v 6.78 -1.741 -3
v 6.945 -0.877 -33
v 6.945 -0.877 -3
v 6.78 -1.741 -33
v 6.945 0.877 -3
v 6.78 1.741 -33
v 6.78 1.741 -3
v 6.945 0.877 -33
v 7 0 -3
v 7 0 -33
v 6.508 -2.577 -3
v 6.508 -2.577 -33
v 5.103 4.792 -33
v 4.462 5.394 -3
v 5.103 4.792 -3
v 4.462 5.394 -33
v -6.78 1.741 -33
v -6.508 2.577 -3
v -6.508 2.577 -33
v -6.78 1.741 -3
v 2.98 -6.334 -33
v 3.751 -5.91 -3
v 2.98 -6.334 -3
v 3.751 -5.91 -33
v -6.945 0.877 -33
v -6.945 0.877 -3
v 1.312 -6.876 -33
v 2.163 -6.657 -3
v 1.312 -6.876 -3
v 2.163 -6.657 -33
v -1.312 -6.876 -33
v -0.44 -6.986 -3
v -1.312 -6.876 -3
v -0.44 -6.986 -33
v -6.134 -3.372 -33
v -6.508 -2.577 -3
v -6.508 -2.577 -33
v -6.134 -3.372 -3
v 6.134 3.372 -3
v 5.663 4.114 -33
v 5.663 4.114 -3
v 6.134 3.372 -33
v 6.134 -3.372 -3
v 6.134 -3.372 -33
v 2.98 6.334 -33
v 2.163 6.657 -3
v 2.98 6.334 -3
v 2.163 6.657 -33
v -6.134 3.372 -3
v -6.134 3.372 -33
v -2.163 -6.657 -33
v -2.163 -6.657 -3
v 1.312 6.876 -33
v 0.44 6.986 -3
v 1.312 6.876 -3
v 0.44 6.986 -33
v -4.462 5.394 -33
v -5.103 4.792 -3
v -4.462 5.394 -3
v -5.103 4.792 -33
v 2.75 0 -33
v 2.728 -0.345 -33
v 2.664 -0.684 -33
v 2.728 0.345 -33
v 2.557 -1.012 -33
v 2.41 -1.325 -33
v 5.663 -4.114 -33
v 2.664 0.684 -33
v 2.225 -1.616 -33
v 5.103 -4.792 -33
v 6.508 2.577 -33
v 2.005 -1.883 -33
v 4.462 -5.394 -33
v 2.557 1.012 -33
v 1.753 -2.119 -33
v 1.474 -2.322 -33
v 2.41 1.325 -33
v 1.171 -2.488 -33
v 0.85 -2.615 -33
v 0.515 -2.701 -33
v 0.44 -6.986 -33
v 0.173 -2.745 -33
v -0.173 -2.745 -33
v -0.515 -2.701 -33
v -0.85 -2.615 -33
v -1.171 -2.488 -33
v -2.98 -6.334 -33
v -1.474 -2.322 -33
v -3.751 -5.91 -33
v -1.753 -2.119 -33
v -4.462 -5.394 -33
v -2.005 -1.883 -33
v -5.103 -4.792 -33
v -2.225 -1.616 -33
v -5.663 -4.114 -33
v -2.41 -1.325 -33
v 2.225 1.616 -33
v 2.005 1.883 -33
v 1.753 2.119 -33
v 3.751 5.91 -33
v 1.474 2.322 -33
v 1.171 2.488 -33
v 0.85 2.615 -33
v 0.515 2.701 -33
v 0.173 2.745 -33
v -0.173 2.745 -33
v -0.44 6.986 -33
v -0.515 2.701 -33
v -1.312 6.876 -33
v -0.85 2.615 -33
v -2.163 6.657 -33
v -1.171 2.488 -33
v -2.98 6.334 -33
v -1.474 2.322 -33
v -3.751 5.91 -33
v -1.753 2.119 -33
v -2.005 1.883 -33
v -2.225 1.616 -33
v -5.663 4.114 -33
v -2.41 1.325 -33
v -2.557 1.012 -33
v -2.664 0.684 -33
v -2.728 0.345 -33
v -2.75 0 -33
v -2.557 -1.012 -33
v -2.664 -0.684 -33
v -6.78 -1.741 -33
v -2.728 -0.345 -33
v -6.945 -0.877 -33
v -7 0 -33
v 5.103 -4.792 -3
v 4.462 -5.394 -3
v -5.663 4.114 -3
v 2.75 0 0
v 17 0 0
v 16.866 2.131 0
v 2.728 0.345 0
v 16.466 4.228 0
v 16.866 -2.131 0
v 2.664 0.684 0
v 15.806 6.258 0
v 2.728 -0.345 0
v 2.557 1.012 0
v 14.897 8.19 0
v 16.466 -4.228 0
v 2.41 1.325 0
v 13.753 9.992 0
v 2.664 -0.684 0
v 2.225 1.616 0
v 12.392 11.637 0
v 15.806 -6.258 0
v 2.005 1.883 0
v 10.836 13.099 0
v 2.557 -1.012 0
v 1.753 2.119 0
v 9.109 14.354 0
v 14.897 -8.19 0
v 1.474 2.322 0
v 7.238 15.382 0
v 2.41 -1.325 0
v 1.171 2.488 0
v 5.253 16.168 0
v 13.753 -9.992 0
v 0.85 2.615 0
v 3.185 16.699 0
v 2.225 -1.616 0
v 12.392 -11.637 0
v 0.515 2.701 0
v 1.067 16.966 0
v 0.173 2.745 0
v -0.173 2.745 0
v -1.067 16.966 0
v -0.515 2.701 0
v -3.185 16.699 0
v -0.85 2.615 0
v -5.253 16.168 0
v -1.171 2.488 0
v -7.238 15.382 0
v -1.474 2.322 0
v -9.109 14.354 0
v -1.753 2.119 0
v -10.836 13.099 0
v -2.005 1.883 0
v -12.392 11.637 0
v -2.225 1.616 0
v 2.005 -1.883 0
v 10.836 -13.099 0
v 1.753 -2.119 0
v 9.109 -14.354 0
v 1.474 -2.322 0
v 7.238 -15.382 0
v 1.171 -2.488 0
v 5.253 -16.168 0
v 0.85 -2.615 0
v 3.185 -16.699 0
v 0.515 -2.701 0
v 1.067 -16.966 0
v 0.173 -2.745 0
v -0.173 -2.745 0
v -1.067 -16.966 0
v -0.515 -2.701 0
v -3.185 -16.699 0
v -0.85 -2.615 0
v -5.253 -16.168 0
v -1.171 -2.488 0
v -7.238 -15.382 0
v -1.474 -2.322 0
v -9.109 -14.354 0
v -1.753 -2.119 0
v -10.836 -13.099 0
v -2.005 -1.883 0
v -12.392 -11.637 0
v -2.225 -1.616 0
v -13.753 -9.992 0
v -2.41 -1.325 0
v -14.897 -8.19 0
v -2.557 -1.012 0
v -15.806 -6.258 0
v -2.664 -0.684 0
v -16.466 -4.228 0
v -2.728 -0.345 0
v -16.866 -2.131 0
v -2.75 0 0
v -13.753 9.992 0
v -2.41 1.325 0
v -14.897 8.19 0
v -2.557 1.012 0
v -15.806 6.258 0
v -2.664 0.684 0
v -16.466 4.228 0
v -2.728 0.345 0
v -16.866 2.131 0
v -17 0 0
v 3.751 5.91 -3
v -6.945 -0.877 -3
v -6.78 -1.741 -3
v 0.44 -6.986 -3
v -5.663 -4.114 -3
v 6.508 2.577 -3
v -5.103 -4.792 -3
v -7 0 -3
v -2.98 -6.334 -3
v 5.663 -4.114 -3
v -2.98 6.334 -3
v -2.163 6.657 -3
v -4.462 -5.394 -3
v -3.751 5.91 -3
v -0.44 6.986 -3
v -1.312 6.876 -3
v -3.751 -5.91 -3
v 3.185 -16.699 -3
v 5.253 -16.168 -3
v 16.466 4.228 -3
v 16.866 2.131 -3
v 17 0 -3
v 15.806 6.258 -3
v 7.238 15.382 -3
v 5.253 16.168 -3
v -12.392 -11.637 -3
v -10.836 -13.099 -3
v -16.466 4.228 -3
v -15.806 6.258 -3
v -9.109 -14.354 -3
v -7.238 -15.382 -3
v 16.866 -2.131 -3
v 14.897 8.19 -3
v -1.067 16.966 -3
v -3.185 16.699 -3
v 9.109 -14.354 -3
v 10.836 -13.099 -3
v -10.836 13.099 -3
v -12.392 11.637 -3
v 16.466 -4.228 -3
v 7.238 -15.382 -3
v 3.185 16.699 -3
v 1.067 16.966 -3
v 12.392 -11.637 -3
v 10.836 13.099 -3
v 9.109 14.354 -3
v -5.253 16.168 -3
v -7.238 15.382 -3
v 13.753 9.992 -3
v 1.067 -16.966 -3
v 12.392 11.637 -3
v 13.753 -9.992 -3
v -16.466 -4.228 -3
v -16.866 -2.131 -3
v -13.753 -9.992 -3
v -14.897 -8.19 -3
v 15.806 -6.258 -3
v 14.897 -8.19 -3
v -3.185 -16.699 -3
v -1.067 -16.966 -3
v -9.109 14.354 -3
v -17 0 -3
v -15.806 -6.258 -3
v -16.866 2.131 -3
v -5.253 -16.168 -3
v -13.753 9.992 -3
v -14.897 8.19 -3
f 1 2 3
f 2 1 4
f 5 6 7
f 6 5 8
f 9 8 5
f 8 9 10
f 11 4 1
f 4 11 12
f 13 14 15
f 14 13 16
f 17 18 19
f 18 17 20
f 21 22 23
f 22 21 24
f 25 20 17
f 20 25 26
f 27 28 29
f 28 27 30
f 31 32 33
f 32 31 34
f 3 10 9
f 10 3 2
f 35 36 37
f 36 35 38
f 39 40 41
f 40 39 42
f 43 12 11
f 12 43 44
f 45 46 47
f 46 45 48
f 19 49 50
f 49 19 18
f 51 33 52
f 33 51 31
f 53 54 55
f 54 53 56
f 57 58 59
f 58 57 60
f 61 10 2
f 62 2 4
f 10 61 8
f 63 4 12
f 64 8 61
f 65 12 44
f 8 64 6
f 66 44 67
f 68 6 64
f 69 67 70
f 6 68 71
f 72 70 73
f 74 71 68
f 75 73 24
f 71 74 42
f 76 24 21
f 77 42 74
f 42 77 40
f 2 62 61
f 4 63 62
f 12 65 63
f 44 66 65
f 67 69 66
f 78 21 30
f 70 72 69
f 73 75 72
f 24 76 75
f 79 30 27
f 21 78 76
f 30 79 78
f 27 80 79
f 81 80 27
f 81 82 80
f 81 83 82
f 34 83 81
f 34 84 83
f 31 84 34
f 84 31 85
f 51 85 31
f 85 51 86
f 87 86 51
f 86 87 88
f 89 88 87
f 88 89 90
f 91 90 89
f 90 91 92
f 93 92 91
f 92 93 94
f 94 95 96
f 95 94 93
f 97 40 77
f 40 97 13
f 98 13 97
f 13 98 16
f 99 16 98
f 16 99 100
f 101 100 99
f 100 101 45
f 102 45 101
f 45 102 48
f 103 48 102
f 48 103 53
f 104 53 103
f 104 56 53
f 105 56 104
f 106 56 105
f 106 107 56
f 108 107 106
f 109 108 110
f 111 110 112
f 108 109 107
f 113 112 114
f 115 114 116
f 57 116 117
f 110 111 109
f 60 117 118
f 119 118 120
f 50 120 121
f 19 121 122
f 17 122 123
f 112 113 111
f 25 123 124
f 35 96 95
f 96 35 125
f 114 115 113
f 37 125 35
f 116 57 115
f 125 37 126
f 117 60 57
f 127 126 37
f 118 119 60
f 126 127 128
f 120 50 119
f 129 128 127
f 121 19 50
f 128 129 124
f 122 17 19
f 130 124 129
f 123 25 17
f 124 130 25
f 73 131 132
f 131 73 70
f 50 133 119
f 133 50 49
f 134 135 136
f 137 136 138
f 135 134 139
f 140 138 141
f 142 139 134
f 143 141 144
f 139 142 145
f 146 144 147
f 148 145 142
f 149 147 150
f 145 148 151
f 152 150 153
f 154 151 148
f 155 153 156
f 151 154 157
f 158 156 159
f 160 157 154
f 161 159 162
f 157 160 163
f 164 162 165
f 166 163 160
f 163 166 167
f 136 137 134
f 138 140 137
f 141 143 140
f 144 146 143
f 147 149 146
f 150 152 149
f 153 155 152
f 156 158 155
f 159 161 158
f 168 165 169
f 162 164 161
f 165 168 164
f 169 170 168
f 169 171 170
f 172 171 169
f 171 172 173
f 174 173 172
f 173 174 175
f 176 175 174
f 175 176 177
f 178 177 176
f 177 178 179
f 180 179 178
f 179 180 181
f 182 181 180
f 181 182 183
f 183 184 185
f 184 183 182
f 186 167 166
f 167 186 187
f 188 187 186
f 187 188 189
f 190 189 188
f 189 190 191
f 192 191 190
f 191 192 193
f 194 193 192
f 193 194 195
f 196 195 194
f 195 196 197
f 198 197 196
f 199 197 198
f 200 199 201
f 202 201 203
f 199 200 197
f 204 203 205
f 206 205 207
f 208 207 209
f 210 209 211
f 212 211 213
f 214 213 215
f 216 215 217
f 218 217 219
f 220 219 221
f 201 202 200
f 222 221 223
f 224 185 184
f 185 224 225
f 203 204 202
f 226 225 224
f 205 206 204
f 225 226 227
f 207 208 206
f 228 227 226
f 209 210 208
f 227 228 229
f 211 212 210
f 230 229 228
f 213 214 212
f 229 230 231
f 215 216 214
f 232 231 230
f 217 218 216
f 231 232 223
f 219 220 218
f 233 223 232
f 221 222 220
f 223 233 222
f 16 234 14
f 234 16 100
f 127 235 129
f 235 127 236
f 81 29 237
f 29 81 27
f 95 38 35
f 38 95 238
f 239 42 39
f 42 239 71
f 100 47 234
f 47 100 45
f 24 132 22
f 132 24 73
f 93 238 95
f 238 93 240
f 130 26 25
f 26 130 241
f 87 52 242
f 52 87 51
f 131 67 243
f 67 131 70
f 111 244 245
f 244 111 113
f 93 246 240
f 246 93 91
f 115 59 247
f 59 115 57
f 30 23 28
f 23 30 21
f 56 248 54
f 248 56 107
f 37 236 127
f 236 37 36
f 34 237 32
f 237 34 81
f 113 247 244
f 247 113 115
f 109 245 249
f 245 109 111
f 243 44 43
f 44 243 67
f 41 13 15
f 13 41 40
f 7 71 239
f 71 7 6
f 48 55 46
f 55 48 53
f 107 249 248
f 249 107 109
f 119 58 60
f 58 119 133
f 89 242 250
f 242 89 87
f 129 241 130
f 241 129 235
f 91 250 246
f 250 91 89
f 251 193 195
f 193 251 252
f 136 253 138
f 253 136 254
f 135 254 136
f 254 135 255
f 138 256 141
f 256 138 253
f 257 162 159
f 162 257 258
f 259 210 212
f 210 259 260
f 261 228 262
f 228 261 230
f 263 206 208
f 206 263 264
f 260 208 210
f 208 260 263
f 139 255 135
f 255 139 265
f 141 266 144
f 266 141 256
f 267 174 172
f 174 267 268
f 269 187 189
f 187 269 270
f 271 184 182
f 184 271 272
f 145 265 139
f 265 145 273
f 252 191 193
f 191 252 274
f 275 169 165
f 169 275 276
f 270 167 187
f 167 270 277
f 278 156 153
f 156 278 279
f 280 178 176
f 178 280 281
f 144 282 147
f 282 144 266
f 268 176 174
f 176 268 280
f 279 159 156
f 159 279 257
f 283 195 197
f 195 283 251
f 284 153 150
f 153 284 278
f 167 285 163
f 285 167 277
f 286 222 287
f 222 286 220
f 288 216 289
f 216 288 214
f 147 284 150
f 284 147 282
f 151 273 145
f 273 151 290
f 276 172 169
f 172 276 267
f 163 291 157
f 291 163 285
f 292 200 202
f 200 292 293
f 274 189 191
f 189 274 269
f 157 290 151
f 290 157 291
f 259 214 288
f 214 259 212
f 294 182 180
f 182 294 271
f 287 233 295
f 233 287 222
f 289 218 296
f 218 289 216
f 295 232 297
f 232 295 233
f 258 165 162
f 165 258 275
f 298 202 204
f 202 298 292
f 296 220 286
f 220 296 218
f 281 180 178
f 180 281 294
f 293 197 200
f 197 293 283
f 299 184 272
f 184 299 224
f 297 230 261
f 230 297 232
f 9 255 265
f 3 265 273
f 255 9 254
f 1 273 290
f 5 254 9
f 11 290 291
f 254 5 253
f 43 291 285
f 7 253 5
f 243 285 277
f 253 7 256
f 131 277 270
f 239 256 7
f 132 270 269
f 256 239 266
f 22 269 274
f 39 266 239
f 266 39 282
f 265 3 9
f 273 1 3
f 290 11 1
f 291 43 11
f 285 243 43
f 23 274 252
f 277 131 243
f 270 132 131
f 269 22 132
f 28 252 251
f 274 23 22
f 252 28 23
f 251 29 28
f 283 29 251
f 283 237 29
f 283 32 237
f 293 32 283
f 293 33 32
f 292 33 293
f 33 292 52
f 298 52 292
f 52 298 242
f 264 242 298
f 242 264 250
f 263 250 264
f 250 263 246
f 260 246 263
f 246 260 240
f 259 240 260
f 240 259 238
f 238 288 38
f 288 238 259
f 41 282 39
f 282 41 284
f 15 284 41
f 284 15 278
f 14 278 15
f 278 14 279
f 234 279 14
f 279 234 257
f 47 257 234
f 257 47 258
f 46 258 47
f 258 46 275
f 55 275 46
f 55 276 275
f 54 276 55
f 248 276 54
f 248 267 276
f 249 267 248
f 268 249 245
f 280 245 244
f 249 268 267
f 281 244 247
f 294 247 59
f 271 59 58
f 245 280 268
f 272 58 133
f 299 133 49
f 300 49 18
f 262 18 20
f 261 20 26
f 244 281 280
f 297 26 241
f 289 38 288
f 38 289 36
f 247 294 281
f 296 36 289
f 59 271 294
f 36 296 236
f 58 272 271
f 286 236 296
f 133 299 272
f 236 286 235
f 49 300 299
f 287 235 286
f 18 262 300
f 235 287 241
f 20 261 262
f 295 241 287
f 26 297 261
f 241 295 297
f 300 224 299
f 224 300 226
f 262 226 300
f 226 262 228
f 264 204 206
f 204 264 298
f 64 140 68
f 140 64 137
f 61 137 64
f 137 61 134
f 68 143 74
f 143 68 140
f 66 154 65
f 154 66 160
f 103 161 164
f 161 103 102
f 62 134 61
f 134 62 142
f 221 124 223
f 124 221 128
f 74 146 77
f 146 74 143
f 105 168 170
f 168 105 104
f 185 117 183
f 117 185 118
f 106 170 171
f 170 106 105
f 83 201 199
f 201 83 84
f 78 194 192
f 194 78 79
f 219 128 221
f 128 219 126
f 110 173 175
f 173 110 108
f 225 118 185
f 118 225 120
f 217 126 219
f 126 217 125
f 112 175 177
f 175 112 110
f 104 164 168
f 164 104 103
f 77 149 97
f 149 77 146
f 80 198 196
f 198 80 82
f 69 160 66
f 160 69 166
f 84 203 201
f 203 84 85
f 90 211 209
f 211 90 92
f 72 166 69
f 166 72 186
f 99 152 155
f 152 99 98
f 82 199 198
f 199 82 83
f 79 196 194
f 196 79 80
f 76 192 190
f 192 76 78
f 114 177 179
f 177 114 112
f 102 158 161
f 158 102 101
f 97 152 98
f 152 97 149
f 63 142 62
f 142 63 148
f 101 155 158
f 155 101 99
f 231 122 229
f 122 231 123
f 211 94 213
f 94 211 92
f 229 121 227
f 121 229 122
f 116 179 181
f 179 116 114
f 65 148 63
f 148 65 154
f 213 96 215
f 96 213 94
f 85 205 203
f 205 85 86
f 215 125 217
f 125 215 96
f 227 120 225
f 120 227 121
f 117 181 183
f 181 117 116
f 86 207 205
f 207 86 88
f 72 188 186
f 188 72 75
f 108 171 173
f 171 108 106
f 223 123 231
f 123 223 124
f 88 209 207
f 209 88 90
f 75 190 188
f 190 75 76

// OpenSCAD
$fn = 50;


difference() {
	union() {
		translate(v = [0, 0, -33.0000000000]) {
			cylinder(h = 33, r = 7.0000000000);
		}
		translate(v = [0, 0, -3.0000000000]) {
			cylinder(h = 3, r = 17.0000000000);
		}
	}
	union() {
		#translate(v = [0, 0, -33]) {
			cylinder(h = 33, r = 2.7500000000);
		}
	}
}
